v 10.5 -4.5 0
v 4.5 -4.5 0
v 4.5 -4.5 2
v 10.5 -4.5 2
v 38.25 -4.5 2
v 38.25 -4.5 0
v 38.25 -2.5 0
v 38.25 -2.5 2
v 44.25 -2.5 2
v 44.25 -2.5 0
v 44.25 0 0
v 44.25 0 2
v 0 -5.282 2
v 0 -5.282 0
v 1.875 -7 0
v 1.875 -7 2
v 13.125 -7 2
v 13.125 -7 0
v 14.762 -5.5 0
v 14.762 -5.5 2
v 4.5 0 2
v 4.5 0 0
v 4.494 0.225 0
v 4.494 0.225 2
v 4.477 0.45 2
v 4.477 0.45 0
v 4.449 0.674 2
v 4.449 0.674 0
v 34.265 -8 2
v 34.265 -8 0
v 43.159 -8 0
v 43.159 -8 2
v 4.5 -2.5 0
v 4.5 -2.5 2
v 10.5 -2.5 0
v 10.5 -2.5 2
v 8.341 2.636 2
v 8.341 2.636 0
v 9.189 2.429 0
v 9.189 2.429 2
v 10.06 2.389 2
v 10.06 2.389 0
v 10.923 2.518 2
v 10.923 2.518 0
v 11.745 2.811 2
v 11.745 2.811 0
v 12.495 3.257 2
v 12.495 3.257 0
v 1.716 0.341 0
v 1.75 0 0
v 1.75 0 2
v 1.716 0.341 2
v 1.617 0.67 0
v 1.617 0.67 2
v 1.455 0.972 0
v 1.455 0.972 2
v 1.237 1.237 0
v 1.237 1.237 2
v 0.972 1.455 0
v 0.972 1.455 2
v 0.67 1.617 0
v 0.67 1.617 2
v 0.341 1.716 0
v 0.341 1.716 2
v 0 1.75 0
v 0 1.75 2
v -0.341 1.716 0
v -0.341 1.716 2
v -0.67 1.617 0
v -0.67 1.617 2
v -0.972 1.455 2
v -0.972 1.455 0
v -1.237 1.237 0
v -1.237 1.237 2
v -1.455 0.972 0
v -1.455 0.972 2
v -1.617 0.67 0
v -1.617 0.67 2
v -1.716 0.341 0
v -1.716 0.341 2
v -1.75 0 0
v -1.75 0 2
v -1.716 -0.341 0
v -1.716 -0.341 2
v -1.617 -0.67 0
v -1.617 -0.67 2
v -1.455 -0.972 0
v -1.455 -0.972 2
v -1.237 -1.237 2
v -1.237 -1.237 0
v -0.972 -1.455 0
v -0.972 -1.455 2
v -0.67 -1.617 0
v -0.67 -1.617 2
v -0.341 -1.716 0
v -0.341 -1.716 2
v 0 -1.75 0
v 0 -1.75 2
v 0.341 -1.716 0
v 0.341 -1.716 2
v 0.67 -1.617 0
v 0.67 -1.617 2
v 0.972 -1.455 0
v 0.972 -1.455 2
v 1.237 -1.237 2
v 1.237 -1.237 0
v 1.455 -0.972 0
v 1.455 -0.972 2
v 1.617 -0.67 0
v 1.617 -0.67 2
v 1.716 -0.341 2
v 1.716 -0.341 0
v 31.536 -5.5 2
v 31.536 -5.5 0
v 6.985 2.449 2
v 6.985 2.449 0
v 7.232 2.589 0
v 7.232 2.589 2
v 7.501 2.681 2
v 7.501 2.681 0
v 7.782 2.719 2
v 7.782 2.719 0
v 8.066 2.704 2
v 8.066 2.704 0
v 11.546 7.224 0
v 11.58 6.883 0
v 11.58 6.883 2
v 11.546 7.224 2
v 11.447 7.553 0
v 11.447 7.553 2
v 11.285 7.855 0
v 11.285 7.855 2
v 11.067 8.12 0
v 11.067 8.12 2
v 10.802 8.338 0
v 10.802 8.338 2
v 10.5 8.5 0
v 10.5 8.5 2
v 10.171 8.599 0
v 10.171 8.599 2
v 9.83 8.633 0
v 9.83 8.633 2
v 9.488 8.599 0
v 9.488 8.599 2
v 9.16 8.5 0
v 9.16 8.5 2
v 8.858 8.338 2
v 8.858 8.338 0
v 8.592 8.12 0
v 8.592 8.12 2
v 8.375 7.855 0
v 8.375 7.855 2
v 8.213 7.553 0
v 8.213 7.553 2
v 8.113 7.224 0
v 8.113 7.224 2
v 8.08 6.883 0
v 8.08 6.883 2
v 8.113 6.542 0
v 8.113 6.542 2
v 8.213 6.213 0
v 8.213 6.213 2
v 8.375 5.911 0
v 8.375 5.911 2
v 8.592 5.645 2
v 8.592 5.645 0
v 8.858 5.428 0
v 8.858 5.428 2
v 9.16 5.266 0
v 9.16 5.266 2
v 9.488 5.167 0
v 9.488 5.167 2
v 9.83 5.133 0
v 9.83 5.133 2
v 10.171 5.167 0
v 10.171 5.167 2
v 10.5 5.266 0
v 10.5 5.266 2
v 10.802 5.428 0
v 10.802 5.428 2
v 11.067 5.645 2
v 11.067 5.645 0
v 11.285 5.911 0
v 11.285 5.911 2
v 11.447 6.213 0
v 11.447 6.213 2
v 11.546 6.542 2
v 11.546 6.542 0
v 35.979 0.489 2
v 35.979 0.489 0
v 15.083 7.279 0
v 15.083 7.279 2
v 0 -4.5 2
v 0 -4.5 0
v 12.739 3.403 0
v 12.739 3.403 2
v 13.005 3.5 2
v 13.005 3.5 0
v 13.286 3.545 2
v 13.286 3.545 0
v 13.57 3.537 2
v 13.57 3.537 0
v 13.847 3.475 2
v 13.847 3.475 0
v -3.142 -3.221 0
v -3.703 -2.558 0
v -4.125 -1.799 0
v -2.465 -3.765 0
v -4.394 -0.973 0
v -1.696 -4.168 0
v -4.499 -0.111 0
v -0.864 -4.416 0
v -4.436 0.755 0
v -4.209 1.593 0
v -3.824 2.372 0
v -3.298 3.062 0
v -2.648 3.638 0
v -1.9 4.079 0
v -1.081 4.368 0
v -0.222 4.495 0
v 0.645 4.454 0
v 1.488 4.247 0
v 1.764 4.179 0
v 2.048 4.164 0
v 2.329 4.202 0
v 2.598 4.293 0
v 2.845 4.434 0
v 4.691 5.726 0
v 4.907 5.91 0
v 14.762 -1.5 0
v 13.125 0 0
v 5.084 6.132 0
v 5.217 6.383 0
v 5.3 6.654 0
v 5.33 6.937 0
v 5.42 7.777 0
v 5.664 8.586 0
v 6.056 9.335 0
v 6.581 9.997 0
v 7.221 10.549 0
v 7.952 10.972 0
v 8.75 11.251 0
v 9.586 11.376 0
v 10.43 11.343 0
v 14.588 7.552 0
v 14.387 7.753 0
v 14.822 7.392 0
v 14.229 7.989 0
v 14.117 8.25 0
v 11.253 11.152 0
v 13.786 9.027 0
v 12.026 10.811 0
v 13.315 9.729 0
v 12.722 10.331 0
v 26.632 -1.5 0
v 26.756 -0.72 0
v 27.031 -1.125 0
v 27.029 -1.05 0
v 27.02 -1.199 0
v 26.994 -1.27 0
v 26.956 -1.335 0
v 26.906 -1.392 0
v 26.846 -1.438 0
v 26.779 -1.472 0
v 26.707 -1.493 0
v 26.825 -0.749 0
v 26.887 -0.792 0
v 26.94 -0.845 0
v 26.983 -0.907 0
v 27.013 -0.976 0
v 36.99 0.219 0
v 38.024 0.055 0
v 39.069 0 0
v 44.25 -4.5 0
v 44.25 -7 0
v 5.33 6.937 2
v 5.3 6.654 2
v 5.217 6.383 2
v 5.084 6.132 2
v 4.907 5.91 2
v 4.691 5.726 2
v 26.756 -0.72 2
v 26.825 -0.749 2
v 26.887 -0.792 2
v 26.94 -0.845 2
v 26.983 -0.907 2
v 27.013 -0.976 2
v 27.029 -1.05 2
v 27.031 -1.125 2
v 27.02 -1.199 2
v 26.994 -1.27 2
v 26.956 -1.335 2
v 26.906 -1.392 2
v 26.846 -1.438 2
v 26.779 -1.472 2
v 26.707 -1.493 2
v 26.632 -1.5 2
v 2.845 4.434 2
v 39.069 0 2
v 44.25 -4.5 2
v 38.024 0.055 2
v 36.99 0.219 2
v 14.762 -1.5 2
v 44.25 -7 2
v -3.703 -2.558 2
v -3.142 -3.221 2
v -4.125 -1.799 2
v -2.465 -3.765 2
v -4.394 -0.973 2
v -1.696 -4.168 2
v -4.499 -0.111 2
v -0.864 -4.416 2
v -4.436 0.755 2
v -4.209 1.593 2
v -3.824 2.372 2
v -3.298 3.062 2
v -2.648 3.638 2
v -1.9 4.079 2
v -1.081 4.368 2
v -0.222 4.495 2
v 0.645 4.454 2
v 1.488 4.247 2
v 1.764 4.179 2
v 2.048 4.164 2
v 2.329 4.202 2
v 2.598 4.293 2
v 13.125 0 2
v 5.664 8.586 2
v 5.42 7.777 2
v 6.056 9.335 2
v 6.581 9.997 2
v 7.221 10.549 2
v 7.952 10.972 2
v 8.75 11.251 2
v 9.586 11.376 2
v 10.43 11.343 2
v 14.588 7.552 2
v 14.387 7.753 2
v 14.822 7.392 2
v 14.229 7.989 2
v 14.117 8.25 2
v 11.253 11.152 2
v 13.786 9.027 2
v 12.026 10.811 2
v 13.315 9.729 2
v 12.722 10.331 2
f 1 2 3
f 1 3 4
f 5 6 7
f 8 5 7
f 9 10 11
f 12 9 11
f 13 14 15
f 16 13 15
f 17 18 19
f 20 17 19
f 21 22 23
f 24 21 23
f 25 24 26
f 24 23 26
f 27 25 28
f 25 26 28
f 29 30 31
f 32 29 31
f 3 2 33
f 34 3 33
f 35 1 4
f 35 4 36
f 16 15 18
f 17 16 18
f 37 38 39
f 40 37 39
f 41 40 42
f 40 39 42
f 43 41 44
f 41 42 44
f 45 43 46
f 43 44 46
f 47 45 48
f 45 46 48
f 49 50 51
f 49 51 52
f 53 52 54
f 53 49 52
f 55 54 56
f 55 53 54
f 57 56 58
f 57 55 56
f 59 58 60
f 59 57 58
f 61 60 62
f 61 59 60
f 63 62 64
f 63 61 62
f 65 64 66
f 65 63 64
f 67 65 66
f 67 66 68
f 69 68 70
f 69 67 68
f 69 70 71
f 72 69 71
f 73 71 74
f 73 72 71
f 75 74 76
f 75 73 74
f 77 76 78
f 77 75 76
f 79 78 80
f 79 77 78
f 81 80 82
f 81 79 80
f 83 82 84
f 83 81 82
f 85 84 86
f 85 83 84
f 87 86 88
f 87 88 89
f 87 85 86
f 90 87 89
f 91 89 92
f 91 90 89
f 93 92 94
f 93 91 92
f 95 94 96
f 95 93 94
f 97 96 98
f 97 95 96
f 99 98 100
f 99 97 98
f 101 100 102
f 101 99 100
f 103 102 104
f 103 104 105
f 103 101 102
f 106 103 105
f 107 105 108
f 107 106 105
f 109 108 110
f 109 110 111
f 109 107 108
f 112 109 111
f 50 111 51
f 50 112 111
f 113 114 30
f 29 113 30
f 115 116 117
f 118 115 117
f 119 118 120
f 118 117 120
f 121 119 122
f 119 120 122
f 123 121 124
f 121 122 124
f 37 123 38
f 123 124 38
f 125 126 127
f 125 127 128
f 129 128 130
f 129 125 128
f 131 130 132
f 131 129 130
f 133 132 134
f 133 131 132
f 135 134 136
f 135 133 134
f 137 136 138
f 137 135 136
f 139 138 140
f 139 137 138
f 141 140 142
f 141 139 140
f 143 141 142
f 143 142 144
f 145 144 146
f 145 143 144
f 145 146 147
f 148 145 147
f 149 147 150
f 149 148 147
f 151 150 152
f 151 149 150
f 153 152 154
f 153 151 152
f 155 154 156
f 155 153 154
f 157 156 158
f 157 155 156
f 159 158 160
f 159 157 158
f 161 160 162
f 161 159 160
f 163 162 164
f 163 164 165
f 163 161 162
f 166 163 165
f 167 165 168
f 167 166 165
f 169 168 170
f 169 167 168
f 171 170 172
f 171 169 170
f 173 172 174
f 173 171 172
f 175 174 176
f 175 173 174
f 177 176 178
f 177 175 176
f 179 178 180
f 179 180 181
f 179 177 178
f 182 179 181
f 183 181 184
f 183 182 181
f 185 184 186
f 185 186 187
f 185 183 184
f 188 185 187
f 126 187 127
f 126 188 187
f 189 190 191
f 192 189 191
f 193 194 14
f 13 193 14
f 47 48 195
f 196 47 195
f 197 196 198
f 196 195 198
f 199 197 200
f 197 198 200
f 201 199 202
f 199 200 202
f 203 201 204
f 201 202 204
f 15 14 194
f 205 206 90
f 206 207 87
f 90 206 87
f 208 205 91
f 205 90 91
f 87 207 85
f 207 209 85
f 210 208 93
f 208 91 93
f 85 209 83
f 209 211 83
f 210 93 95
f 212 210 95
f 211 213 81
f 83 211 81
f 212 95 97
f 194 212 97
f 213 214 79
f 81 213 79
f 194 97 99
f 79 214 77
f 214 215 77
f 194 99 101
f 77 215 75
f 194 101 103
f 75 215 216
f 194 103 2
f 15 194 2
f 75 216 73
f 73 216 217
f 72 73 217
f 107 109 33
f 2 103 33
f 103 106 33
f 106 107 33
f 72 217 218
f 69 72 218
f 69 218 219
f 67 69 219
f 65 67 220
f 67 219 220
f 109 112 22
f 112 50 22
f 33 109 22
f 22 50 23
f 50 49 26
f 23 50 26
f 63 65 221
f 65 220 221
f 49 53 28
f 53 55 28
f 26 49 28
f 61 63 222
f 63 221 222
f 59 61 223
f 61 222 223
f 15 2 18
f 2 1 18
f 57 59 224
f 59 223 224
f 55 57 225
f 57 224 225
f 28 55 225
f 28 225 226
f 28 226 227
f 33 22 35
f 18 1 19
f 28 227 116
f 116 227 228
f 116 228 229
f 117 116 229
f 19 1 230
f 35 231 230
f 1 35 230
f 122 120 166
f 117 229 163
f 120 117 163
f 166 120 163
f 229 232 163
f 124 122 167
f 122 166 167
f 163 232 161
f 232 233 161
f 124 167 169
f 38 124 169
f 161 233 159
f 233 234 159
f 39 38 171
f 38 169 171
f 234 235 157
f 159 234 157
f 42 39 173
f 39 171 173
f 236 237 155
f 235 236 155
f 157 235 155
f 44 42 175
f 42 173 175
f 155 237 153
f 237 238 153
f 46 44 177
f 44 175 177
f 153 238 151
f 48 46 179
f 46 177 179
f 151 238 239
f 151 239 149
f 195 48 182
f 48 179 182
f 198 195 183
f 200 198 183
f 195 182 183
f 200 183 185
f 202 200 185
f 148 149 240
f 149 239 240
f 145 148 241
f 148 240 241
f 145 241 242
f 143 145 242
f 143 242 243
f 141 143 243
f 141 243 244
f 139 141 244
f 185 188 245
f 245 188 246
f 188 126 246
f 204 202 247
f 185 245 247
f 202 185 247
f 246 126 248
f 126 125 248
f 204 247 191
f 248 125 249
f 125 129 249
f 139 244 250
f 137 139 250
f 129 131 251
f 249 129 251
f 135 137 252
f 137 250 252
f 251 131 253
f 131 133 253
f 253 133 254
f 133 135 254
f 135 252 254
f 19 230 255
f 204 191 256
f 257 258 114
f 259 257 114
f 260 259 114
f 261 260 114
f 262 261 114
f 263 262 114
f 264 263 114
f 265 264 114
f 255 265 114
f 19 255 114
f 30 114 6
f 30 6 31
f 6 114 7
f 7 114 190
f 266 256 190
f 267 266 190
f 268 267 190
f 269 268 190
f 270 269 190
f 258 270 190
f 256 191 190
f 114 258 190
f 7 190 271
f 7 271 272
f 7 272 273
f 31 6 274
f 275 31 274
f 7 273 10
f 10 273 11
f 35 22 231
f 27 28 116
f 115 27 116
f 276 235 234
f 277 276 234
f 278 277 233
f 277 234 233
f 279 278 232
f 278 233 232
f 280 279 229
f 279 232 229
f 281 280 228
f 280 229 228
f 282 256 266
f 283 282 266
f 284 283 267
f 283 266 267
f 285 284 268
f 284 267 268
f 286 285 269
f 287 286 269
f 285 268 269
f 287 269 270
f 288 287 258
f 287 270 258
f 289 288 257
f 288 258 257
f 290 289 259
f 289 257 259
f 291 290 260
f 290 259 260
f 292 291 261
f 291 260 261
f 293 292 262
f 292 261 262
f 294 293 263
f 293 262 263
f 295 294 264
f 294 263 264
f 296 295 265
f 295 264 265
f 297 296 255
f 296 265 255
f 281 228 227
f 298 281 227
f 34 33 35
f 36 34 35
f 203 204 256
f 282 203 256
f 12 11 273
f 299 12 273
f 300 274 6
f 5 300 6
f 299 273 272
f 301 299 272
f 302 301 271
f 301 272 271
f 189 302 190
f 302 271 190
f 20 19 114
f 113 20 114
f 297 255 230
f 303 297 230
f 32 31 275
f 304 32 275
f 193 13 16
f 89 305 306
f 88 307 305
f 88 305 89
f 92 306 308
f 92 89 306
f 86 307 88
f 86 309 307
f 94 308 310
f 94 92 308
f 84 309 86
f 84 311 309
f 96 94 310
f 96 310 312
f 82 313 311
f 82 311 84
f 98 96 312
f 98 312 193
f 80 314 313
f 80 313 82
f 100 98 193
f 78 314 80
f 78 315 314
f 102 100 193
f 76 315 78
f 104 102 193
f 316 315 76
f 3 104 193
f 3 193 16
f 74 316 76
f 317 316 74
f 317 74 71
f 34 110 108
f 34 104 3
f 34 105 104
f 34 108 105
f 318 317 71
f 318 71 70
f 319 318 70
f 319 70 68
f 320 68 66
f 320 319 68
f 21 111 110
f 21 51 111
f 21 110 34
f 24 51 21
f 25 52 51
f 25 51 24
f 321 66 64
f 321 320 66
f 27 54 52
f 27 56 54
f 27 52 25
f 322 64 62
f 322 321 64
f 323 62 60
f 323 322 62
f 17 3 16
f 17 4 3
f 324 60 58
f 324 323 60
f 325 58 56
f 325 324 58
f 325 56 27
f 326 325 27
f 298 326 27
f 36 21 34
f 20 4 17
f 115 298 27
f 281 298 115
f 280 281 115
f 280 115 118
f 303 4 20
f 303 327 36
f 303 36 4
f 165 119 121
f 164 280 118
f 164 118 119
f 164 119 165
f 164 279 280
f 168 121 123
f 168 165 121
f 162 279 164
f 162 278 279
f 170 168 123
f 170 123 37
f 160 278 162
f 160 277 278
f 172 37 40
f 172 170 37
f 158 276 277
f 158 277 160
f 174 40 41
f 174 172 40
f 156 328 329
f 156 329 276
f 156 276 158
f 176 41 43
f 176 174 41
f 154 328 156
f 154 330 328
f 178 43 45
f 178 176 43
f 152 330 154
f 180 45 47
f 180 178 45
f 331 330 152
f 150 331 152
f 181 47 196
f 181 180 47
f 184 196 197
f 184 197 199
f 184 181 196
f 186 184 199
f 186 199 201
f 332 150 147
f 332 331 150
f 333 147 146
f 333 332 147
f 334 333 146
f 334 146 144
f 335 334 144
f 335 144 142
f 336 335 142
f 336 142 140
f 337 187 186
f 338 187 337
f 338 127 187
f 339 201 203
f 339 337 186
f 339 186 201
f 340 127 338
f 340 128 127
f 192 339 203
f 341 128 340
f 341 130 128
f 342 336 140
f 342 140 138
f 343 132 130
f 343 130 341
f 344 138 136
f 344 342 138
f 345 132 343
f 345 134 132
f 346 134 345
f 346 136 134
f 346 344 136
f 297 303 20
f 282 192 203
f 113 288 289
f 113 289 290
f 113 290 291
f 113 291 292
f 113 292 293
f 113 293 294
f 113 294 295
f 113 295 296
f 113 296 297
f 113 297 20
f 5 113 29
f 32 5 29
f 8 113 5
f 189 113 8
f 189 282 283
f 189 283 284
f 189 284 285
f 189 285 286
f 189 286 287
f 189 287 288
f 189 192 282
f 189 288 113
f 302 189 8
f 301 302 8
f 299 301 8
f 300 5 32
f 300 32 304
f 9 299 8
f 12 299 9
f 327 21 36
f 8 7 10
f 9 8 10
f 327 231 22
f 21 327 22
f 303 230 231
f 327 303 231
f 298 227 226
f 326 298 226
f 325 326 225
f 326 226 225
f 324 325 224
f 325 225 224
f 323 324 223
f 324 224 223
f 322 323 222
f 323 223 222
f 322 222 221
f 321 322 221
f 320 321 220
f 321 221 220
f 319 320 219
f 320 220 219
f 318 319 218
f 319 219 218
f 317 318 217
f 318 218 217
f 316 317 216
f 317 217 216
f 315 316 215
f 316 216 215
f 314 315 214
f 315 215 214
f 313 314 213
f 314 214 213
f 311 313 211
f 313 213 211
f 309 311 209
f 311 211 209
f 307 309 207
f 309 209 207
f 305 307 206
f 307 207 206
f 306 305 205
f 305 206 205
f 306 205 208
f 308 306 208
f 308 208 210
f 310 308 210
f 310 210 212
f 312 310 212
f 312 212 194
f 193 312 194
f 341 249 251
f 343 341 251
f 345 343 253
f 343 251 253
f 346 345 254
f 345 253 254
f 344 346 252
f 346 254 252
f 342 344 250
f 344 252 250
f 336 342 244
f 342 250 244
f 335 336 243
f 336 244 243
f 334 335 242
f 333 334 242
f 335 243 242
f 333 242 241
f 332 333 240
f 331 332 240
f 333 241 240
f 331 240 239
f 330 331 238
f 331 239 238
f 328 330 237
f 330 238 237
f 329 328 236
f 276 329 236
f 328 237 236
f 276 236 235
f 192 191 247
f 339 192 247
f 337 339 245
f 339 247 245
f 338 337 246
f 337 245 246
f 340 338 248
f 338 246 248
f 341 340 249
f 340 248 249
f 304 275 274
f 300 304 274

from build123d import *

# Parameters (mm, degrees)
SKETCH1_R           = 1.75
SKETCH1_W           = 6
SKETCH1_H           = 2
BOSS_EXTRUDE1_DEPTH = 2


with BuildPart() as part:
    # Sketch1 → Boss-Extrude1 (new body)
    with BuildSketch(Plane.XY):
        with BuildLine():
            Line((4.690618402, 5.725955542), (2.844900384, 4.433569872))
            ThreePointArc((2.844900384, 4.433569872), (2.189215725, 4.176328188), (1.488401797, 4.246723454))
            ThreePointArc((1.488401797, 4.246723454), (-4.436229003, 0.754898821), (0, -4.5))
            Line((0, -4.5), (0, -5.281879049))
            Line((0, -5.281879049), (1.875, -7))
            Line((1.875, -7), (13.125, -7))
            Line((13.125, -7), (14.761962752, -5.5))
            Line((14.761962752, -5.5), (31.536424497, -5.5))
            Line((31.536424497, -5.5), (34.26469575, -8))
            Line((34.26469575, -8), (43.158691499, -8))
            Line((43.158691499, -8), (44.25, -7))
            Line((44.25, -7), (44.25, -4.5))
            Line((44.25, -4.5), (38.25, -4.5))
            Line((38.25, -4.5), (38.25, -2.5))
            Line((38.25, -2.5), (44.25, -2.5))
            Line((44.25, -2.5), (44.25, 0))
            Line((44.25, 0), (39.069245955, 0))
            ThreePointArc((39.069245955, 0), (37.504901305, 0.123116594), (35.979076012, 0.489434837))
            Line((35.979076012, 0.489434837), (15.082734658, 7.279067722))
            ThreePointArc((15.082734658, 7.279067722), (14.482691436, 7.647908864), (14.117151245, 8.249968682))
            ThreePointArc((14.117151245, 8.249968682), (9.164682181, 11.333488621), (5.330146444, 6.936742015))
            ThreePointArc((5.330146444, 6.936742015), (5.156603875, 6.254115739), (4.690618402, 5.725955542))
        make_face()
        Circle(SKETCH1_R, mode=Mode.SUBTRACT)
        with Locations((9.829824531, 6.882917236)):
            Circle(SKETCH1_R, mode=Mode.SUBTRACT)
        with Locations((7.5, -3.5)):
            Rectangle(SKETCH1_W, SKETCH1_H, mode=Mode.SUBTRACT)
        with BuildLine():
            Line((13.84666668, 3.474841657), (26.75576114, -0.719577393))
            ThreePointArc((26.75576114, -0.719577393), (27.027229678, -1.162573786), (26.632154342, -1.5))
            Line((26.632154342, -1.5), (14.761962752, -1.5))
            Line((14.761962752, -1.5), (13.125, 0))
            Line((13.125, 0), (4.5, 0))
            ThreePointArc((4.5, 0), (4.487297154, 0.337882015), (4.449260331, 0.673856446))
            Line((4.449260331, 0.673856446), (6.984924148, 2.449347365))
            ThreePointArc((6.984924148, 2.449347365), (7.640608806, 2.706589049), (8.341422735, 2.636193783))
            ThreePointArc((8.341422735, 2.636193783), (10.494966882, 2.432345851), (12.494812024, 3.256921971))
            ThreePointArc((12.494812024, 3.256921971), (13.144422133, 3.529139461), (13.84666668, 3.474841657))
        make_face(mode=Mode.SUBTRACT)
    extrude(amount=BOSS_EXTRUDE1_DEPTH)


solid = part.part
